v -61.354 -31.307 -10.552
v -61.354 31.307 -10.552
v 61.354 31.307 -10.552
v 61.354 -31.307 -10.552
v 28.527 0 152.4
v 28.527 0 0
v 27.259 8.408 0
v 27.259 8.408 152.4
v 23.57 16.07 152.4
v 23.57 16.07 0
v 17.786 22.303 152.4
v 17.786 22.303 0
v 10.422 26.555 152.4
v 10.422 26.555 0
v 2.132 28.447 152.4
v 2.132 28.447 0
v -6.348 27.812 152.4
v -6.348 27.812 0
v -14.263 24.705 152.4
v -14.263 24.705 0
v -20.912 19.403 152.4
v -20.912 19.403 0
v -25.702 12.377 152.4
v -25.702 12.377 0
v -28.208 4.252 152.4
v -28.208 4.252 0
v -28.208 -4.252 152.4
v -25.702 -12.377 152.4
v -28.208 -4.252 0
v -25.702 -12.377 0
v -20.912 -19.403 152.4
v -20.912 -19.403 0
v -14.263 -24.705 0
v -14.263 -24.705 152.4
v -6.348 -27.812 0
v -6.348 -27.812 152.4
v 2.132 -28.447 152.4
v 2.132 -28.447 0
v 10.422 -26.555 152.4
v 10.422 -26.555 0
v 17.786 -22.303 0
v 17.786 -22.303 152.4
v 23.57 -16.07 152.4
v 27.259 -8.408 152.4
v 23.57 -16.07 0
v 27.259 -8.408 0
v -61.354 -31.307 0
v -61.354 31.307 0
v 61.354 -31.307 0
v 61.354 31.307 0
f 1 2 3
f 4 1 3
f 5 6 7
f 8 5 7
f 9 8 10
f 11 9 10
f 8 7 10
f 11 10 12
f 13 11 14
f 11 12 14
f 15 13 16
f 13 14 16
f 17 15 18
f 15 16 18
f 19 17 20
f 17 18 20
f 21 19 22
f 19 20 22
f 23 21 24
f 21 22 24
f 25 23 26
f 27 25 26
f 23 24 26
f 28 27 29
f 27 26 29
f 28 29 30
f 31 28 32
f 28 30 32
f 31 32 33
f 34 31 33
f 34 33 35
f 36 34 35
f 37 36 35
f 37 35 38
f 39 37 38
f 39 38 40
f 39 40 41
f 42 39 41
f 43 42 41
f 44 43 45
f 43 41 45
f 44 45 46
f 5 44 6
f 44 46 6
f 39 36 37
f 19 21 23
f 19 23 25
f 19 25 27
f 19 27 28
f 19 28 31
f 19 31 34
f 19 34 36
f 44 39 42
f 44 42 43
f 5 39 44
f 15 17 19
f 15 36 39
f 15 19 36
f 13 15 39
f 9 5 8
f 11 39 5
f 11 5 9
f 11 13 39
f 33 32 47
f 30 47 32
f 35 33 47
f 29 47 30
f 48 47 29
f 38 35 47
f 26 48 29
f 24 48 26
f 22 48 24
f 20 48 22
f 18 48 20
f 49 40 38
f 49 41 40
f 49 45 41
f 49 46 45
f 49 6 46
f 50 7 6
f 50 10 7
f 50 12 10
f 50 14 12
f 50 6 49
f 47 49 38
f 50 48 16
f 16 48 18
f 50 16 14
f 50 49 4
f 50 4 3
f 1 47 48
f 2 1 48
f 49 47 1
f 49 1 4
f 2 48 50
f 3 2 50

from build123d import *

# Parameters (mm, degrees)
F0_R     = 28.526815
F1_DEPTH = 152.4
F2_W     = 122.707962
F2_H     = 62.613734
F3_DEPTH = 10.551801


with BuildPart() as f1:
    # F0 (on Top) → F1 (new body)
    with BuildSketch(Plane.XY):
        Circle(F0_R)
    extrude(amount=F1_DEPTH)

    # F2 (on Top) → F3 (join)
    with BuildSketch(Plane.XY):
        Rectangle(F2_W, F2_H)
    extrude(amount=-F3_DEPTH)


solid = f1.part
